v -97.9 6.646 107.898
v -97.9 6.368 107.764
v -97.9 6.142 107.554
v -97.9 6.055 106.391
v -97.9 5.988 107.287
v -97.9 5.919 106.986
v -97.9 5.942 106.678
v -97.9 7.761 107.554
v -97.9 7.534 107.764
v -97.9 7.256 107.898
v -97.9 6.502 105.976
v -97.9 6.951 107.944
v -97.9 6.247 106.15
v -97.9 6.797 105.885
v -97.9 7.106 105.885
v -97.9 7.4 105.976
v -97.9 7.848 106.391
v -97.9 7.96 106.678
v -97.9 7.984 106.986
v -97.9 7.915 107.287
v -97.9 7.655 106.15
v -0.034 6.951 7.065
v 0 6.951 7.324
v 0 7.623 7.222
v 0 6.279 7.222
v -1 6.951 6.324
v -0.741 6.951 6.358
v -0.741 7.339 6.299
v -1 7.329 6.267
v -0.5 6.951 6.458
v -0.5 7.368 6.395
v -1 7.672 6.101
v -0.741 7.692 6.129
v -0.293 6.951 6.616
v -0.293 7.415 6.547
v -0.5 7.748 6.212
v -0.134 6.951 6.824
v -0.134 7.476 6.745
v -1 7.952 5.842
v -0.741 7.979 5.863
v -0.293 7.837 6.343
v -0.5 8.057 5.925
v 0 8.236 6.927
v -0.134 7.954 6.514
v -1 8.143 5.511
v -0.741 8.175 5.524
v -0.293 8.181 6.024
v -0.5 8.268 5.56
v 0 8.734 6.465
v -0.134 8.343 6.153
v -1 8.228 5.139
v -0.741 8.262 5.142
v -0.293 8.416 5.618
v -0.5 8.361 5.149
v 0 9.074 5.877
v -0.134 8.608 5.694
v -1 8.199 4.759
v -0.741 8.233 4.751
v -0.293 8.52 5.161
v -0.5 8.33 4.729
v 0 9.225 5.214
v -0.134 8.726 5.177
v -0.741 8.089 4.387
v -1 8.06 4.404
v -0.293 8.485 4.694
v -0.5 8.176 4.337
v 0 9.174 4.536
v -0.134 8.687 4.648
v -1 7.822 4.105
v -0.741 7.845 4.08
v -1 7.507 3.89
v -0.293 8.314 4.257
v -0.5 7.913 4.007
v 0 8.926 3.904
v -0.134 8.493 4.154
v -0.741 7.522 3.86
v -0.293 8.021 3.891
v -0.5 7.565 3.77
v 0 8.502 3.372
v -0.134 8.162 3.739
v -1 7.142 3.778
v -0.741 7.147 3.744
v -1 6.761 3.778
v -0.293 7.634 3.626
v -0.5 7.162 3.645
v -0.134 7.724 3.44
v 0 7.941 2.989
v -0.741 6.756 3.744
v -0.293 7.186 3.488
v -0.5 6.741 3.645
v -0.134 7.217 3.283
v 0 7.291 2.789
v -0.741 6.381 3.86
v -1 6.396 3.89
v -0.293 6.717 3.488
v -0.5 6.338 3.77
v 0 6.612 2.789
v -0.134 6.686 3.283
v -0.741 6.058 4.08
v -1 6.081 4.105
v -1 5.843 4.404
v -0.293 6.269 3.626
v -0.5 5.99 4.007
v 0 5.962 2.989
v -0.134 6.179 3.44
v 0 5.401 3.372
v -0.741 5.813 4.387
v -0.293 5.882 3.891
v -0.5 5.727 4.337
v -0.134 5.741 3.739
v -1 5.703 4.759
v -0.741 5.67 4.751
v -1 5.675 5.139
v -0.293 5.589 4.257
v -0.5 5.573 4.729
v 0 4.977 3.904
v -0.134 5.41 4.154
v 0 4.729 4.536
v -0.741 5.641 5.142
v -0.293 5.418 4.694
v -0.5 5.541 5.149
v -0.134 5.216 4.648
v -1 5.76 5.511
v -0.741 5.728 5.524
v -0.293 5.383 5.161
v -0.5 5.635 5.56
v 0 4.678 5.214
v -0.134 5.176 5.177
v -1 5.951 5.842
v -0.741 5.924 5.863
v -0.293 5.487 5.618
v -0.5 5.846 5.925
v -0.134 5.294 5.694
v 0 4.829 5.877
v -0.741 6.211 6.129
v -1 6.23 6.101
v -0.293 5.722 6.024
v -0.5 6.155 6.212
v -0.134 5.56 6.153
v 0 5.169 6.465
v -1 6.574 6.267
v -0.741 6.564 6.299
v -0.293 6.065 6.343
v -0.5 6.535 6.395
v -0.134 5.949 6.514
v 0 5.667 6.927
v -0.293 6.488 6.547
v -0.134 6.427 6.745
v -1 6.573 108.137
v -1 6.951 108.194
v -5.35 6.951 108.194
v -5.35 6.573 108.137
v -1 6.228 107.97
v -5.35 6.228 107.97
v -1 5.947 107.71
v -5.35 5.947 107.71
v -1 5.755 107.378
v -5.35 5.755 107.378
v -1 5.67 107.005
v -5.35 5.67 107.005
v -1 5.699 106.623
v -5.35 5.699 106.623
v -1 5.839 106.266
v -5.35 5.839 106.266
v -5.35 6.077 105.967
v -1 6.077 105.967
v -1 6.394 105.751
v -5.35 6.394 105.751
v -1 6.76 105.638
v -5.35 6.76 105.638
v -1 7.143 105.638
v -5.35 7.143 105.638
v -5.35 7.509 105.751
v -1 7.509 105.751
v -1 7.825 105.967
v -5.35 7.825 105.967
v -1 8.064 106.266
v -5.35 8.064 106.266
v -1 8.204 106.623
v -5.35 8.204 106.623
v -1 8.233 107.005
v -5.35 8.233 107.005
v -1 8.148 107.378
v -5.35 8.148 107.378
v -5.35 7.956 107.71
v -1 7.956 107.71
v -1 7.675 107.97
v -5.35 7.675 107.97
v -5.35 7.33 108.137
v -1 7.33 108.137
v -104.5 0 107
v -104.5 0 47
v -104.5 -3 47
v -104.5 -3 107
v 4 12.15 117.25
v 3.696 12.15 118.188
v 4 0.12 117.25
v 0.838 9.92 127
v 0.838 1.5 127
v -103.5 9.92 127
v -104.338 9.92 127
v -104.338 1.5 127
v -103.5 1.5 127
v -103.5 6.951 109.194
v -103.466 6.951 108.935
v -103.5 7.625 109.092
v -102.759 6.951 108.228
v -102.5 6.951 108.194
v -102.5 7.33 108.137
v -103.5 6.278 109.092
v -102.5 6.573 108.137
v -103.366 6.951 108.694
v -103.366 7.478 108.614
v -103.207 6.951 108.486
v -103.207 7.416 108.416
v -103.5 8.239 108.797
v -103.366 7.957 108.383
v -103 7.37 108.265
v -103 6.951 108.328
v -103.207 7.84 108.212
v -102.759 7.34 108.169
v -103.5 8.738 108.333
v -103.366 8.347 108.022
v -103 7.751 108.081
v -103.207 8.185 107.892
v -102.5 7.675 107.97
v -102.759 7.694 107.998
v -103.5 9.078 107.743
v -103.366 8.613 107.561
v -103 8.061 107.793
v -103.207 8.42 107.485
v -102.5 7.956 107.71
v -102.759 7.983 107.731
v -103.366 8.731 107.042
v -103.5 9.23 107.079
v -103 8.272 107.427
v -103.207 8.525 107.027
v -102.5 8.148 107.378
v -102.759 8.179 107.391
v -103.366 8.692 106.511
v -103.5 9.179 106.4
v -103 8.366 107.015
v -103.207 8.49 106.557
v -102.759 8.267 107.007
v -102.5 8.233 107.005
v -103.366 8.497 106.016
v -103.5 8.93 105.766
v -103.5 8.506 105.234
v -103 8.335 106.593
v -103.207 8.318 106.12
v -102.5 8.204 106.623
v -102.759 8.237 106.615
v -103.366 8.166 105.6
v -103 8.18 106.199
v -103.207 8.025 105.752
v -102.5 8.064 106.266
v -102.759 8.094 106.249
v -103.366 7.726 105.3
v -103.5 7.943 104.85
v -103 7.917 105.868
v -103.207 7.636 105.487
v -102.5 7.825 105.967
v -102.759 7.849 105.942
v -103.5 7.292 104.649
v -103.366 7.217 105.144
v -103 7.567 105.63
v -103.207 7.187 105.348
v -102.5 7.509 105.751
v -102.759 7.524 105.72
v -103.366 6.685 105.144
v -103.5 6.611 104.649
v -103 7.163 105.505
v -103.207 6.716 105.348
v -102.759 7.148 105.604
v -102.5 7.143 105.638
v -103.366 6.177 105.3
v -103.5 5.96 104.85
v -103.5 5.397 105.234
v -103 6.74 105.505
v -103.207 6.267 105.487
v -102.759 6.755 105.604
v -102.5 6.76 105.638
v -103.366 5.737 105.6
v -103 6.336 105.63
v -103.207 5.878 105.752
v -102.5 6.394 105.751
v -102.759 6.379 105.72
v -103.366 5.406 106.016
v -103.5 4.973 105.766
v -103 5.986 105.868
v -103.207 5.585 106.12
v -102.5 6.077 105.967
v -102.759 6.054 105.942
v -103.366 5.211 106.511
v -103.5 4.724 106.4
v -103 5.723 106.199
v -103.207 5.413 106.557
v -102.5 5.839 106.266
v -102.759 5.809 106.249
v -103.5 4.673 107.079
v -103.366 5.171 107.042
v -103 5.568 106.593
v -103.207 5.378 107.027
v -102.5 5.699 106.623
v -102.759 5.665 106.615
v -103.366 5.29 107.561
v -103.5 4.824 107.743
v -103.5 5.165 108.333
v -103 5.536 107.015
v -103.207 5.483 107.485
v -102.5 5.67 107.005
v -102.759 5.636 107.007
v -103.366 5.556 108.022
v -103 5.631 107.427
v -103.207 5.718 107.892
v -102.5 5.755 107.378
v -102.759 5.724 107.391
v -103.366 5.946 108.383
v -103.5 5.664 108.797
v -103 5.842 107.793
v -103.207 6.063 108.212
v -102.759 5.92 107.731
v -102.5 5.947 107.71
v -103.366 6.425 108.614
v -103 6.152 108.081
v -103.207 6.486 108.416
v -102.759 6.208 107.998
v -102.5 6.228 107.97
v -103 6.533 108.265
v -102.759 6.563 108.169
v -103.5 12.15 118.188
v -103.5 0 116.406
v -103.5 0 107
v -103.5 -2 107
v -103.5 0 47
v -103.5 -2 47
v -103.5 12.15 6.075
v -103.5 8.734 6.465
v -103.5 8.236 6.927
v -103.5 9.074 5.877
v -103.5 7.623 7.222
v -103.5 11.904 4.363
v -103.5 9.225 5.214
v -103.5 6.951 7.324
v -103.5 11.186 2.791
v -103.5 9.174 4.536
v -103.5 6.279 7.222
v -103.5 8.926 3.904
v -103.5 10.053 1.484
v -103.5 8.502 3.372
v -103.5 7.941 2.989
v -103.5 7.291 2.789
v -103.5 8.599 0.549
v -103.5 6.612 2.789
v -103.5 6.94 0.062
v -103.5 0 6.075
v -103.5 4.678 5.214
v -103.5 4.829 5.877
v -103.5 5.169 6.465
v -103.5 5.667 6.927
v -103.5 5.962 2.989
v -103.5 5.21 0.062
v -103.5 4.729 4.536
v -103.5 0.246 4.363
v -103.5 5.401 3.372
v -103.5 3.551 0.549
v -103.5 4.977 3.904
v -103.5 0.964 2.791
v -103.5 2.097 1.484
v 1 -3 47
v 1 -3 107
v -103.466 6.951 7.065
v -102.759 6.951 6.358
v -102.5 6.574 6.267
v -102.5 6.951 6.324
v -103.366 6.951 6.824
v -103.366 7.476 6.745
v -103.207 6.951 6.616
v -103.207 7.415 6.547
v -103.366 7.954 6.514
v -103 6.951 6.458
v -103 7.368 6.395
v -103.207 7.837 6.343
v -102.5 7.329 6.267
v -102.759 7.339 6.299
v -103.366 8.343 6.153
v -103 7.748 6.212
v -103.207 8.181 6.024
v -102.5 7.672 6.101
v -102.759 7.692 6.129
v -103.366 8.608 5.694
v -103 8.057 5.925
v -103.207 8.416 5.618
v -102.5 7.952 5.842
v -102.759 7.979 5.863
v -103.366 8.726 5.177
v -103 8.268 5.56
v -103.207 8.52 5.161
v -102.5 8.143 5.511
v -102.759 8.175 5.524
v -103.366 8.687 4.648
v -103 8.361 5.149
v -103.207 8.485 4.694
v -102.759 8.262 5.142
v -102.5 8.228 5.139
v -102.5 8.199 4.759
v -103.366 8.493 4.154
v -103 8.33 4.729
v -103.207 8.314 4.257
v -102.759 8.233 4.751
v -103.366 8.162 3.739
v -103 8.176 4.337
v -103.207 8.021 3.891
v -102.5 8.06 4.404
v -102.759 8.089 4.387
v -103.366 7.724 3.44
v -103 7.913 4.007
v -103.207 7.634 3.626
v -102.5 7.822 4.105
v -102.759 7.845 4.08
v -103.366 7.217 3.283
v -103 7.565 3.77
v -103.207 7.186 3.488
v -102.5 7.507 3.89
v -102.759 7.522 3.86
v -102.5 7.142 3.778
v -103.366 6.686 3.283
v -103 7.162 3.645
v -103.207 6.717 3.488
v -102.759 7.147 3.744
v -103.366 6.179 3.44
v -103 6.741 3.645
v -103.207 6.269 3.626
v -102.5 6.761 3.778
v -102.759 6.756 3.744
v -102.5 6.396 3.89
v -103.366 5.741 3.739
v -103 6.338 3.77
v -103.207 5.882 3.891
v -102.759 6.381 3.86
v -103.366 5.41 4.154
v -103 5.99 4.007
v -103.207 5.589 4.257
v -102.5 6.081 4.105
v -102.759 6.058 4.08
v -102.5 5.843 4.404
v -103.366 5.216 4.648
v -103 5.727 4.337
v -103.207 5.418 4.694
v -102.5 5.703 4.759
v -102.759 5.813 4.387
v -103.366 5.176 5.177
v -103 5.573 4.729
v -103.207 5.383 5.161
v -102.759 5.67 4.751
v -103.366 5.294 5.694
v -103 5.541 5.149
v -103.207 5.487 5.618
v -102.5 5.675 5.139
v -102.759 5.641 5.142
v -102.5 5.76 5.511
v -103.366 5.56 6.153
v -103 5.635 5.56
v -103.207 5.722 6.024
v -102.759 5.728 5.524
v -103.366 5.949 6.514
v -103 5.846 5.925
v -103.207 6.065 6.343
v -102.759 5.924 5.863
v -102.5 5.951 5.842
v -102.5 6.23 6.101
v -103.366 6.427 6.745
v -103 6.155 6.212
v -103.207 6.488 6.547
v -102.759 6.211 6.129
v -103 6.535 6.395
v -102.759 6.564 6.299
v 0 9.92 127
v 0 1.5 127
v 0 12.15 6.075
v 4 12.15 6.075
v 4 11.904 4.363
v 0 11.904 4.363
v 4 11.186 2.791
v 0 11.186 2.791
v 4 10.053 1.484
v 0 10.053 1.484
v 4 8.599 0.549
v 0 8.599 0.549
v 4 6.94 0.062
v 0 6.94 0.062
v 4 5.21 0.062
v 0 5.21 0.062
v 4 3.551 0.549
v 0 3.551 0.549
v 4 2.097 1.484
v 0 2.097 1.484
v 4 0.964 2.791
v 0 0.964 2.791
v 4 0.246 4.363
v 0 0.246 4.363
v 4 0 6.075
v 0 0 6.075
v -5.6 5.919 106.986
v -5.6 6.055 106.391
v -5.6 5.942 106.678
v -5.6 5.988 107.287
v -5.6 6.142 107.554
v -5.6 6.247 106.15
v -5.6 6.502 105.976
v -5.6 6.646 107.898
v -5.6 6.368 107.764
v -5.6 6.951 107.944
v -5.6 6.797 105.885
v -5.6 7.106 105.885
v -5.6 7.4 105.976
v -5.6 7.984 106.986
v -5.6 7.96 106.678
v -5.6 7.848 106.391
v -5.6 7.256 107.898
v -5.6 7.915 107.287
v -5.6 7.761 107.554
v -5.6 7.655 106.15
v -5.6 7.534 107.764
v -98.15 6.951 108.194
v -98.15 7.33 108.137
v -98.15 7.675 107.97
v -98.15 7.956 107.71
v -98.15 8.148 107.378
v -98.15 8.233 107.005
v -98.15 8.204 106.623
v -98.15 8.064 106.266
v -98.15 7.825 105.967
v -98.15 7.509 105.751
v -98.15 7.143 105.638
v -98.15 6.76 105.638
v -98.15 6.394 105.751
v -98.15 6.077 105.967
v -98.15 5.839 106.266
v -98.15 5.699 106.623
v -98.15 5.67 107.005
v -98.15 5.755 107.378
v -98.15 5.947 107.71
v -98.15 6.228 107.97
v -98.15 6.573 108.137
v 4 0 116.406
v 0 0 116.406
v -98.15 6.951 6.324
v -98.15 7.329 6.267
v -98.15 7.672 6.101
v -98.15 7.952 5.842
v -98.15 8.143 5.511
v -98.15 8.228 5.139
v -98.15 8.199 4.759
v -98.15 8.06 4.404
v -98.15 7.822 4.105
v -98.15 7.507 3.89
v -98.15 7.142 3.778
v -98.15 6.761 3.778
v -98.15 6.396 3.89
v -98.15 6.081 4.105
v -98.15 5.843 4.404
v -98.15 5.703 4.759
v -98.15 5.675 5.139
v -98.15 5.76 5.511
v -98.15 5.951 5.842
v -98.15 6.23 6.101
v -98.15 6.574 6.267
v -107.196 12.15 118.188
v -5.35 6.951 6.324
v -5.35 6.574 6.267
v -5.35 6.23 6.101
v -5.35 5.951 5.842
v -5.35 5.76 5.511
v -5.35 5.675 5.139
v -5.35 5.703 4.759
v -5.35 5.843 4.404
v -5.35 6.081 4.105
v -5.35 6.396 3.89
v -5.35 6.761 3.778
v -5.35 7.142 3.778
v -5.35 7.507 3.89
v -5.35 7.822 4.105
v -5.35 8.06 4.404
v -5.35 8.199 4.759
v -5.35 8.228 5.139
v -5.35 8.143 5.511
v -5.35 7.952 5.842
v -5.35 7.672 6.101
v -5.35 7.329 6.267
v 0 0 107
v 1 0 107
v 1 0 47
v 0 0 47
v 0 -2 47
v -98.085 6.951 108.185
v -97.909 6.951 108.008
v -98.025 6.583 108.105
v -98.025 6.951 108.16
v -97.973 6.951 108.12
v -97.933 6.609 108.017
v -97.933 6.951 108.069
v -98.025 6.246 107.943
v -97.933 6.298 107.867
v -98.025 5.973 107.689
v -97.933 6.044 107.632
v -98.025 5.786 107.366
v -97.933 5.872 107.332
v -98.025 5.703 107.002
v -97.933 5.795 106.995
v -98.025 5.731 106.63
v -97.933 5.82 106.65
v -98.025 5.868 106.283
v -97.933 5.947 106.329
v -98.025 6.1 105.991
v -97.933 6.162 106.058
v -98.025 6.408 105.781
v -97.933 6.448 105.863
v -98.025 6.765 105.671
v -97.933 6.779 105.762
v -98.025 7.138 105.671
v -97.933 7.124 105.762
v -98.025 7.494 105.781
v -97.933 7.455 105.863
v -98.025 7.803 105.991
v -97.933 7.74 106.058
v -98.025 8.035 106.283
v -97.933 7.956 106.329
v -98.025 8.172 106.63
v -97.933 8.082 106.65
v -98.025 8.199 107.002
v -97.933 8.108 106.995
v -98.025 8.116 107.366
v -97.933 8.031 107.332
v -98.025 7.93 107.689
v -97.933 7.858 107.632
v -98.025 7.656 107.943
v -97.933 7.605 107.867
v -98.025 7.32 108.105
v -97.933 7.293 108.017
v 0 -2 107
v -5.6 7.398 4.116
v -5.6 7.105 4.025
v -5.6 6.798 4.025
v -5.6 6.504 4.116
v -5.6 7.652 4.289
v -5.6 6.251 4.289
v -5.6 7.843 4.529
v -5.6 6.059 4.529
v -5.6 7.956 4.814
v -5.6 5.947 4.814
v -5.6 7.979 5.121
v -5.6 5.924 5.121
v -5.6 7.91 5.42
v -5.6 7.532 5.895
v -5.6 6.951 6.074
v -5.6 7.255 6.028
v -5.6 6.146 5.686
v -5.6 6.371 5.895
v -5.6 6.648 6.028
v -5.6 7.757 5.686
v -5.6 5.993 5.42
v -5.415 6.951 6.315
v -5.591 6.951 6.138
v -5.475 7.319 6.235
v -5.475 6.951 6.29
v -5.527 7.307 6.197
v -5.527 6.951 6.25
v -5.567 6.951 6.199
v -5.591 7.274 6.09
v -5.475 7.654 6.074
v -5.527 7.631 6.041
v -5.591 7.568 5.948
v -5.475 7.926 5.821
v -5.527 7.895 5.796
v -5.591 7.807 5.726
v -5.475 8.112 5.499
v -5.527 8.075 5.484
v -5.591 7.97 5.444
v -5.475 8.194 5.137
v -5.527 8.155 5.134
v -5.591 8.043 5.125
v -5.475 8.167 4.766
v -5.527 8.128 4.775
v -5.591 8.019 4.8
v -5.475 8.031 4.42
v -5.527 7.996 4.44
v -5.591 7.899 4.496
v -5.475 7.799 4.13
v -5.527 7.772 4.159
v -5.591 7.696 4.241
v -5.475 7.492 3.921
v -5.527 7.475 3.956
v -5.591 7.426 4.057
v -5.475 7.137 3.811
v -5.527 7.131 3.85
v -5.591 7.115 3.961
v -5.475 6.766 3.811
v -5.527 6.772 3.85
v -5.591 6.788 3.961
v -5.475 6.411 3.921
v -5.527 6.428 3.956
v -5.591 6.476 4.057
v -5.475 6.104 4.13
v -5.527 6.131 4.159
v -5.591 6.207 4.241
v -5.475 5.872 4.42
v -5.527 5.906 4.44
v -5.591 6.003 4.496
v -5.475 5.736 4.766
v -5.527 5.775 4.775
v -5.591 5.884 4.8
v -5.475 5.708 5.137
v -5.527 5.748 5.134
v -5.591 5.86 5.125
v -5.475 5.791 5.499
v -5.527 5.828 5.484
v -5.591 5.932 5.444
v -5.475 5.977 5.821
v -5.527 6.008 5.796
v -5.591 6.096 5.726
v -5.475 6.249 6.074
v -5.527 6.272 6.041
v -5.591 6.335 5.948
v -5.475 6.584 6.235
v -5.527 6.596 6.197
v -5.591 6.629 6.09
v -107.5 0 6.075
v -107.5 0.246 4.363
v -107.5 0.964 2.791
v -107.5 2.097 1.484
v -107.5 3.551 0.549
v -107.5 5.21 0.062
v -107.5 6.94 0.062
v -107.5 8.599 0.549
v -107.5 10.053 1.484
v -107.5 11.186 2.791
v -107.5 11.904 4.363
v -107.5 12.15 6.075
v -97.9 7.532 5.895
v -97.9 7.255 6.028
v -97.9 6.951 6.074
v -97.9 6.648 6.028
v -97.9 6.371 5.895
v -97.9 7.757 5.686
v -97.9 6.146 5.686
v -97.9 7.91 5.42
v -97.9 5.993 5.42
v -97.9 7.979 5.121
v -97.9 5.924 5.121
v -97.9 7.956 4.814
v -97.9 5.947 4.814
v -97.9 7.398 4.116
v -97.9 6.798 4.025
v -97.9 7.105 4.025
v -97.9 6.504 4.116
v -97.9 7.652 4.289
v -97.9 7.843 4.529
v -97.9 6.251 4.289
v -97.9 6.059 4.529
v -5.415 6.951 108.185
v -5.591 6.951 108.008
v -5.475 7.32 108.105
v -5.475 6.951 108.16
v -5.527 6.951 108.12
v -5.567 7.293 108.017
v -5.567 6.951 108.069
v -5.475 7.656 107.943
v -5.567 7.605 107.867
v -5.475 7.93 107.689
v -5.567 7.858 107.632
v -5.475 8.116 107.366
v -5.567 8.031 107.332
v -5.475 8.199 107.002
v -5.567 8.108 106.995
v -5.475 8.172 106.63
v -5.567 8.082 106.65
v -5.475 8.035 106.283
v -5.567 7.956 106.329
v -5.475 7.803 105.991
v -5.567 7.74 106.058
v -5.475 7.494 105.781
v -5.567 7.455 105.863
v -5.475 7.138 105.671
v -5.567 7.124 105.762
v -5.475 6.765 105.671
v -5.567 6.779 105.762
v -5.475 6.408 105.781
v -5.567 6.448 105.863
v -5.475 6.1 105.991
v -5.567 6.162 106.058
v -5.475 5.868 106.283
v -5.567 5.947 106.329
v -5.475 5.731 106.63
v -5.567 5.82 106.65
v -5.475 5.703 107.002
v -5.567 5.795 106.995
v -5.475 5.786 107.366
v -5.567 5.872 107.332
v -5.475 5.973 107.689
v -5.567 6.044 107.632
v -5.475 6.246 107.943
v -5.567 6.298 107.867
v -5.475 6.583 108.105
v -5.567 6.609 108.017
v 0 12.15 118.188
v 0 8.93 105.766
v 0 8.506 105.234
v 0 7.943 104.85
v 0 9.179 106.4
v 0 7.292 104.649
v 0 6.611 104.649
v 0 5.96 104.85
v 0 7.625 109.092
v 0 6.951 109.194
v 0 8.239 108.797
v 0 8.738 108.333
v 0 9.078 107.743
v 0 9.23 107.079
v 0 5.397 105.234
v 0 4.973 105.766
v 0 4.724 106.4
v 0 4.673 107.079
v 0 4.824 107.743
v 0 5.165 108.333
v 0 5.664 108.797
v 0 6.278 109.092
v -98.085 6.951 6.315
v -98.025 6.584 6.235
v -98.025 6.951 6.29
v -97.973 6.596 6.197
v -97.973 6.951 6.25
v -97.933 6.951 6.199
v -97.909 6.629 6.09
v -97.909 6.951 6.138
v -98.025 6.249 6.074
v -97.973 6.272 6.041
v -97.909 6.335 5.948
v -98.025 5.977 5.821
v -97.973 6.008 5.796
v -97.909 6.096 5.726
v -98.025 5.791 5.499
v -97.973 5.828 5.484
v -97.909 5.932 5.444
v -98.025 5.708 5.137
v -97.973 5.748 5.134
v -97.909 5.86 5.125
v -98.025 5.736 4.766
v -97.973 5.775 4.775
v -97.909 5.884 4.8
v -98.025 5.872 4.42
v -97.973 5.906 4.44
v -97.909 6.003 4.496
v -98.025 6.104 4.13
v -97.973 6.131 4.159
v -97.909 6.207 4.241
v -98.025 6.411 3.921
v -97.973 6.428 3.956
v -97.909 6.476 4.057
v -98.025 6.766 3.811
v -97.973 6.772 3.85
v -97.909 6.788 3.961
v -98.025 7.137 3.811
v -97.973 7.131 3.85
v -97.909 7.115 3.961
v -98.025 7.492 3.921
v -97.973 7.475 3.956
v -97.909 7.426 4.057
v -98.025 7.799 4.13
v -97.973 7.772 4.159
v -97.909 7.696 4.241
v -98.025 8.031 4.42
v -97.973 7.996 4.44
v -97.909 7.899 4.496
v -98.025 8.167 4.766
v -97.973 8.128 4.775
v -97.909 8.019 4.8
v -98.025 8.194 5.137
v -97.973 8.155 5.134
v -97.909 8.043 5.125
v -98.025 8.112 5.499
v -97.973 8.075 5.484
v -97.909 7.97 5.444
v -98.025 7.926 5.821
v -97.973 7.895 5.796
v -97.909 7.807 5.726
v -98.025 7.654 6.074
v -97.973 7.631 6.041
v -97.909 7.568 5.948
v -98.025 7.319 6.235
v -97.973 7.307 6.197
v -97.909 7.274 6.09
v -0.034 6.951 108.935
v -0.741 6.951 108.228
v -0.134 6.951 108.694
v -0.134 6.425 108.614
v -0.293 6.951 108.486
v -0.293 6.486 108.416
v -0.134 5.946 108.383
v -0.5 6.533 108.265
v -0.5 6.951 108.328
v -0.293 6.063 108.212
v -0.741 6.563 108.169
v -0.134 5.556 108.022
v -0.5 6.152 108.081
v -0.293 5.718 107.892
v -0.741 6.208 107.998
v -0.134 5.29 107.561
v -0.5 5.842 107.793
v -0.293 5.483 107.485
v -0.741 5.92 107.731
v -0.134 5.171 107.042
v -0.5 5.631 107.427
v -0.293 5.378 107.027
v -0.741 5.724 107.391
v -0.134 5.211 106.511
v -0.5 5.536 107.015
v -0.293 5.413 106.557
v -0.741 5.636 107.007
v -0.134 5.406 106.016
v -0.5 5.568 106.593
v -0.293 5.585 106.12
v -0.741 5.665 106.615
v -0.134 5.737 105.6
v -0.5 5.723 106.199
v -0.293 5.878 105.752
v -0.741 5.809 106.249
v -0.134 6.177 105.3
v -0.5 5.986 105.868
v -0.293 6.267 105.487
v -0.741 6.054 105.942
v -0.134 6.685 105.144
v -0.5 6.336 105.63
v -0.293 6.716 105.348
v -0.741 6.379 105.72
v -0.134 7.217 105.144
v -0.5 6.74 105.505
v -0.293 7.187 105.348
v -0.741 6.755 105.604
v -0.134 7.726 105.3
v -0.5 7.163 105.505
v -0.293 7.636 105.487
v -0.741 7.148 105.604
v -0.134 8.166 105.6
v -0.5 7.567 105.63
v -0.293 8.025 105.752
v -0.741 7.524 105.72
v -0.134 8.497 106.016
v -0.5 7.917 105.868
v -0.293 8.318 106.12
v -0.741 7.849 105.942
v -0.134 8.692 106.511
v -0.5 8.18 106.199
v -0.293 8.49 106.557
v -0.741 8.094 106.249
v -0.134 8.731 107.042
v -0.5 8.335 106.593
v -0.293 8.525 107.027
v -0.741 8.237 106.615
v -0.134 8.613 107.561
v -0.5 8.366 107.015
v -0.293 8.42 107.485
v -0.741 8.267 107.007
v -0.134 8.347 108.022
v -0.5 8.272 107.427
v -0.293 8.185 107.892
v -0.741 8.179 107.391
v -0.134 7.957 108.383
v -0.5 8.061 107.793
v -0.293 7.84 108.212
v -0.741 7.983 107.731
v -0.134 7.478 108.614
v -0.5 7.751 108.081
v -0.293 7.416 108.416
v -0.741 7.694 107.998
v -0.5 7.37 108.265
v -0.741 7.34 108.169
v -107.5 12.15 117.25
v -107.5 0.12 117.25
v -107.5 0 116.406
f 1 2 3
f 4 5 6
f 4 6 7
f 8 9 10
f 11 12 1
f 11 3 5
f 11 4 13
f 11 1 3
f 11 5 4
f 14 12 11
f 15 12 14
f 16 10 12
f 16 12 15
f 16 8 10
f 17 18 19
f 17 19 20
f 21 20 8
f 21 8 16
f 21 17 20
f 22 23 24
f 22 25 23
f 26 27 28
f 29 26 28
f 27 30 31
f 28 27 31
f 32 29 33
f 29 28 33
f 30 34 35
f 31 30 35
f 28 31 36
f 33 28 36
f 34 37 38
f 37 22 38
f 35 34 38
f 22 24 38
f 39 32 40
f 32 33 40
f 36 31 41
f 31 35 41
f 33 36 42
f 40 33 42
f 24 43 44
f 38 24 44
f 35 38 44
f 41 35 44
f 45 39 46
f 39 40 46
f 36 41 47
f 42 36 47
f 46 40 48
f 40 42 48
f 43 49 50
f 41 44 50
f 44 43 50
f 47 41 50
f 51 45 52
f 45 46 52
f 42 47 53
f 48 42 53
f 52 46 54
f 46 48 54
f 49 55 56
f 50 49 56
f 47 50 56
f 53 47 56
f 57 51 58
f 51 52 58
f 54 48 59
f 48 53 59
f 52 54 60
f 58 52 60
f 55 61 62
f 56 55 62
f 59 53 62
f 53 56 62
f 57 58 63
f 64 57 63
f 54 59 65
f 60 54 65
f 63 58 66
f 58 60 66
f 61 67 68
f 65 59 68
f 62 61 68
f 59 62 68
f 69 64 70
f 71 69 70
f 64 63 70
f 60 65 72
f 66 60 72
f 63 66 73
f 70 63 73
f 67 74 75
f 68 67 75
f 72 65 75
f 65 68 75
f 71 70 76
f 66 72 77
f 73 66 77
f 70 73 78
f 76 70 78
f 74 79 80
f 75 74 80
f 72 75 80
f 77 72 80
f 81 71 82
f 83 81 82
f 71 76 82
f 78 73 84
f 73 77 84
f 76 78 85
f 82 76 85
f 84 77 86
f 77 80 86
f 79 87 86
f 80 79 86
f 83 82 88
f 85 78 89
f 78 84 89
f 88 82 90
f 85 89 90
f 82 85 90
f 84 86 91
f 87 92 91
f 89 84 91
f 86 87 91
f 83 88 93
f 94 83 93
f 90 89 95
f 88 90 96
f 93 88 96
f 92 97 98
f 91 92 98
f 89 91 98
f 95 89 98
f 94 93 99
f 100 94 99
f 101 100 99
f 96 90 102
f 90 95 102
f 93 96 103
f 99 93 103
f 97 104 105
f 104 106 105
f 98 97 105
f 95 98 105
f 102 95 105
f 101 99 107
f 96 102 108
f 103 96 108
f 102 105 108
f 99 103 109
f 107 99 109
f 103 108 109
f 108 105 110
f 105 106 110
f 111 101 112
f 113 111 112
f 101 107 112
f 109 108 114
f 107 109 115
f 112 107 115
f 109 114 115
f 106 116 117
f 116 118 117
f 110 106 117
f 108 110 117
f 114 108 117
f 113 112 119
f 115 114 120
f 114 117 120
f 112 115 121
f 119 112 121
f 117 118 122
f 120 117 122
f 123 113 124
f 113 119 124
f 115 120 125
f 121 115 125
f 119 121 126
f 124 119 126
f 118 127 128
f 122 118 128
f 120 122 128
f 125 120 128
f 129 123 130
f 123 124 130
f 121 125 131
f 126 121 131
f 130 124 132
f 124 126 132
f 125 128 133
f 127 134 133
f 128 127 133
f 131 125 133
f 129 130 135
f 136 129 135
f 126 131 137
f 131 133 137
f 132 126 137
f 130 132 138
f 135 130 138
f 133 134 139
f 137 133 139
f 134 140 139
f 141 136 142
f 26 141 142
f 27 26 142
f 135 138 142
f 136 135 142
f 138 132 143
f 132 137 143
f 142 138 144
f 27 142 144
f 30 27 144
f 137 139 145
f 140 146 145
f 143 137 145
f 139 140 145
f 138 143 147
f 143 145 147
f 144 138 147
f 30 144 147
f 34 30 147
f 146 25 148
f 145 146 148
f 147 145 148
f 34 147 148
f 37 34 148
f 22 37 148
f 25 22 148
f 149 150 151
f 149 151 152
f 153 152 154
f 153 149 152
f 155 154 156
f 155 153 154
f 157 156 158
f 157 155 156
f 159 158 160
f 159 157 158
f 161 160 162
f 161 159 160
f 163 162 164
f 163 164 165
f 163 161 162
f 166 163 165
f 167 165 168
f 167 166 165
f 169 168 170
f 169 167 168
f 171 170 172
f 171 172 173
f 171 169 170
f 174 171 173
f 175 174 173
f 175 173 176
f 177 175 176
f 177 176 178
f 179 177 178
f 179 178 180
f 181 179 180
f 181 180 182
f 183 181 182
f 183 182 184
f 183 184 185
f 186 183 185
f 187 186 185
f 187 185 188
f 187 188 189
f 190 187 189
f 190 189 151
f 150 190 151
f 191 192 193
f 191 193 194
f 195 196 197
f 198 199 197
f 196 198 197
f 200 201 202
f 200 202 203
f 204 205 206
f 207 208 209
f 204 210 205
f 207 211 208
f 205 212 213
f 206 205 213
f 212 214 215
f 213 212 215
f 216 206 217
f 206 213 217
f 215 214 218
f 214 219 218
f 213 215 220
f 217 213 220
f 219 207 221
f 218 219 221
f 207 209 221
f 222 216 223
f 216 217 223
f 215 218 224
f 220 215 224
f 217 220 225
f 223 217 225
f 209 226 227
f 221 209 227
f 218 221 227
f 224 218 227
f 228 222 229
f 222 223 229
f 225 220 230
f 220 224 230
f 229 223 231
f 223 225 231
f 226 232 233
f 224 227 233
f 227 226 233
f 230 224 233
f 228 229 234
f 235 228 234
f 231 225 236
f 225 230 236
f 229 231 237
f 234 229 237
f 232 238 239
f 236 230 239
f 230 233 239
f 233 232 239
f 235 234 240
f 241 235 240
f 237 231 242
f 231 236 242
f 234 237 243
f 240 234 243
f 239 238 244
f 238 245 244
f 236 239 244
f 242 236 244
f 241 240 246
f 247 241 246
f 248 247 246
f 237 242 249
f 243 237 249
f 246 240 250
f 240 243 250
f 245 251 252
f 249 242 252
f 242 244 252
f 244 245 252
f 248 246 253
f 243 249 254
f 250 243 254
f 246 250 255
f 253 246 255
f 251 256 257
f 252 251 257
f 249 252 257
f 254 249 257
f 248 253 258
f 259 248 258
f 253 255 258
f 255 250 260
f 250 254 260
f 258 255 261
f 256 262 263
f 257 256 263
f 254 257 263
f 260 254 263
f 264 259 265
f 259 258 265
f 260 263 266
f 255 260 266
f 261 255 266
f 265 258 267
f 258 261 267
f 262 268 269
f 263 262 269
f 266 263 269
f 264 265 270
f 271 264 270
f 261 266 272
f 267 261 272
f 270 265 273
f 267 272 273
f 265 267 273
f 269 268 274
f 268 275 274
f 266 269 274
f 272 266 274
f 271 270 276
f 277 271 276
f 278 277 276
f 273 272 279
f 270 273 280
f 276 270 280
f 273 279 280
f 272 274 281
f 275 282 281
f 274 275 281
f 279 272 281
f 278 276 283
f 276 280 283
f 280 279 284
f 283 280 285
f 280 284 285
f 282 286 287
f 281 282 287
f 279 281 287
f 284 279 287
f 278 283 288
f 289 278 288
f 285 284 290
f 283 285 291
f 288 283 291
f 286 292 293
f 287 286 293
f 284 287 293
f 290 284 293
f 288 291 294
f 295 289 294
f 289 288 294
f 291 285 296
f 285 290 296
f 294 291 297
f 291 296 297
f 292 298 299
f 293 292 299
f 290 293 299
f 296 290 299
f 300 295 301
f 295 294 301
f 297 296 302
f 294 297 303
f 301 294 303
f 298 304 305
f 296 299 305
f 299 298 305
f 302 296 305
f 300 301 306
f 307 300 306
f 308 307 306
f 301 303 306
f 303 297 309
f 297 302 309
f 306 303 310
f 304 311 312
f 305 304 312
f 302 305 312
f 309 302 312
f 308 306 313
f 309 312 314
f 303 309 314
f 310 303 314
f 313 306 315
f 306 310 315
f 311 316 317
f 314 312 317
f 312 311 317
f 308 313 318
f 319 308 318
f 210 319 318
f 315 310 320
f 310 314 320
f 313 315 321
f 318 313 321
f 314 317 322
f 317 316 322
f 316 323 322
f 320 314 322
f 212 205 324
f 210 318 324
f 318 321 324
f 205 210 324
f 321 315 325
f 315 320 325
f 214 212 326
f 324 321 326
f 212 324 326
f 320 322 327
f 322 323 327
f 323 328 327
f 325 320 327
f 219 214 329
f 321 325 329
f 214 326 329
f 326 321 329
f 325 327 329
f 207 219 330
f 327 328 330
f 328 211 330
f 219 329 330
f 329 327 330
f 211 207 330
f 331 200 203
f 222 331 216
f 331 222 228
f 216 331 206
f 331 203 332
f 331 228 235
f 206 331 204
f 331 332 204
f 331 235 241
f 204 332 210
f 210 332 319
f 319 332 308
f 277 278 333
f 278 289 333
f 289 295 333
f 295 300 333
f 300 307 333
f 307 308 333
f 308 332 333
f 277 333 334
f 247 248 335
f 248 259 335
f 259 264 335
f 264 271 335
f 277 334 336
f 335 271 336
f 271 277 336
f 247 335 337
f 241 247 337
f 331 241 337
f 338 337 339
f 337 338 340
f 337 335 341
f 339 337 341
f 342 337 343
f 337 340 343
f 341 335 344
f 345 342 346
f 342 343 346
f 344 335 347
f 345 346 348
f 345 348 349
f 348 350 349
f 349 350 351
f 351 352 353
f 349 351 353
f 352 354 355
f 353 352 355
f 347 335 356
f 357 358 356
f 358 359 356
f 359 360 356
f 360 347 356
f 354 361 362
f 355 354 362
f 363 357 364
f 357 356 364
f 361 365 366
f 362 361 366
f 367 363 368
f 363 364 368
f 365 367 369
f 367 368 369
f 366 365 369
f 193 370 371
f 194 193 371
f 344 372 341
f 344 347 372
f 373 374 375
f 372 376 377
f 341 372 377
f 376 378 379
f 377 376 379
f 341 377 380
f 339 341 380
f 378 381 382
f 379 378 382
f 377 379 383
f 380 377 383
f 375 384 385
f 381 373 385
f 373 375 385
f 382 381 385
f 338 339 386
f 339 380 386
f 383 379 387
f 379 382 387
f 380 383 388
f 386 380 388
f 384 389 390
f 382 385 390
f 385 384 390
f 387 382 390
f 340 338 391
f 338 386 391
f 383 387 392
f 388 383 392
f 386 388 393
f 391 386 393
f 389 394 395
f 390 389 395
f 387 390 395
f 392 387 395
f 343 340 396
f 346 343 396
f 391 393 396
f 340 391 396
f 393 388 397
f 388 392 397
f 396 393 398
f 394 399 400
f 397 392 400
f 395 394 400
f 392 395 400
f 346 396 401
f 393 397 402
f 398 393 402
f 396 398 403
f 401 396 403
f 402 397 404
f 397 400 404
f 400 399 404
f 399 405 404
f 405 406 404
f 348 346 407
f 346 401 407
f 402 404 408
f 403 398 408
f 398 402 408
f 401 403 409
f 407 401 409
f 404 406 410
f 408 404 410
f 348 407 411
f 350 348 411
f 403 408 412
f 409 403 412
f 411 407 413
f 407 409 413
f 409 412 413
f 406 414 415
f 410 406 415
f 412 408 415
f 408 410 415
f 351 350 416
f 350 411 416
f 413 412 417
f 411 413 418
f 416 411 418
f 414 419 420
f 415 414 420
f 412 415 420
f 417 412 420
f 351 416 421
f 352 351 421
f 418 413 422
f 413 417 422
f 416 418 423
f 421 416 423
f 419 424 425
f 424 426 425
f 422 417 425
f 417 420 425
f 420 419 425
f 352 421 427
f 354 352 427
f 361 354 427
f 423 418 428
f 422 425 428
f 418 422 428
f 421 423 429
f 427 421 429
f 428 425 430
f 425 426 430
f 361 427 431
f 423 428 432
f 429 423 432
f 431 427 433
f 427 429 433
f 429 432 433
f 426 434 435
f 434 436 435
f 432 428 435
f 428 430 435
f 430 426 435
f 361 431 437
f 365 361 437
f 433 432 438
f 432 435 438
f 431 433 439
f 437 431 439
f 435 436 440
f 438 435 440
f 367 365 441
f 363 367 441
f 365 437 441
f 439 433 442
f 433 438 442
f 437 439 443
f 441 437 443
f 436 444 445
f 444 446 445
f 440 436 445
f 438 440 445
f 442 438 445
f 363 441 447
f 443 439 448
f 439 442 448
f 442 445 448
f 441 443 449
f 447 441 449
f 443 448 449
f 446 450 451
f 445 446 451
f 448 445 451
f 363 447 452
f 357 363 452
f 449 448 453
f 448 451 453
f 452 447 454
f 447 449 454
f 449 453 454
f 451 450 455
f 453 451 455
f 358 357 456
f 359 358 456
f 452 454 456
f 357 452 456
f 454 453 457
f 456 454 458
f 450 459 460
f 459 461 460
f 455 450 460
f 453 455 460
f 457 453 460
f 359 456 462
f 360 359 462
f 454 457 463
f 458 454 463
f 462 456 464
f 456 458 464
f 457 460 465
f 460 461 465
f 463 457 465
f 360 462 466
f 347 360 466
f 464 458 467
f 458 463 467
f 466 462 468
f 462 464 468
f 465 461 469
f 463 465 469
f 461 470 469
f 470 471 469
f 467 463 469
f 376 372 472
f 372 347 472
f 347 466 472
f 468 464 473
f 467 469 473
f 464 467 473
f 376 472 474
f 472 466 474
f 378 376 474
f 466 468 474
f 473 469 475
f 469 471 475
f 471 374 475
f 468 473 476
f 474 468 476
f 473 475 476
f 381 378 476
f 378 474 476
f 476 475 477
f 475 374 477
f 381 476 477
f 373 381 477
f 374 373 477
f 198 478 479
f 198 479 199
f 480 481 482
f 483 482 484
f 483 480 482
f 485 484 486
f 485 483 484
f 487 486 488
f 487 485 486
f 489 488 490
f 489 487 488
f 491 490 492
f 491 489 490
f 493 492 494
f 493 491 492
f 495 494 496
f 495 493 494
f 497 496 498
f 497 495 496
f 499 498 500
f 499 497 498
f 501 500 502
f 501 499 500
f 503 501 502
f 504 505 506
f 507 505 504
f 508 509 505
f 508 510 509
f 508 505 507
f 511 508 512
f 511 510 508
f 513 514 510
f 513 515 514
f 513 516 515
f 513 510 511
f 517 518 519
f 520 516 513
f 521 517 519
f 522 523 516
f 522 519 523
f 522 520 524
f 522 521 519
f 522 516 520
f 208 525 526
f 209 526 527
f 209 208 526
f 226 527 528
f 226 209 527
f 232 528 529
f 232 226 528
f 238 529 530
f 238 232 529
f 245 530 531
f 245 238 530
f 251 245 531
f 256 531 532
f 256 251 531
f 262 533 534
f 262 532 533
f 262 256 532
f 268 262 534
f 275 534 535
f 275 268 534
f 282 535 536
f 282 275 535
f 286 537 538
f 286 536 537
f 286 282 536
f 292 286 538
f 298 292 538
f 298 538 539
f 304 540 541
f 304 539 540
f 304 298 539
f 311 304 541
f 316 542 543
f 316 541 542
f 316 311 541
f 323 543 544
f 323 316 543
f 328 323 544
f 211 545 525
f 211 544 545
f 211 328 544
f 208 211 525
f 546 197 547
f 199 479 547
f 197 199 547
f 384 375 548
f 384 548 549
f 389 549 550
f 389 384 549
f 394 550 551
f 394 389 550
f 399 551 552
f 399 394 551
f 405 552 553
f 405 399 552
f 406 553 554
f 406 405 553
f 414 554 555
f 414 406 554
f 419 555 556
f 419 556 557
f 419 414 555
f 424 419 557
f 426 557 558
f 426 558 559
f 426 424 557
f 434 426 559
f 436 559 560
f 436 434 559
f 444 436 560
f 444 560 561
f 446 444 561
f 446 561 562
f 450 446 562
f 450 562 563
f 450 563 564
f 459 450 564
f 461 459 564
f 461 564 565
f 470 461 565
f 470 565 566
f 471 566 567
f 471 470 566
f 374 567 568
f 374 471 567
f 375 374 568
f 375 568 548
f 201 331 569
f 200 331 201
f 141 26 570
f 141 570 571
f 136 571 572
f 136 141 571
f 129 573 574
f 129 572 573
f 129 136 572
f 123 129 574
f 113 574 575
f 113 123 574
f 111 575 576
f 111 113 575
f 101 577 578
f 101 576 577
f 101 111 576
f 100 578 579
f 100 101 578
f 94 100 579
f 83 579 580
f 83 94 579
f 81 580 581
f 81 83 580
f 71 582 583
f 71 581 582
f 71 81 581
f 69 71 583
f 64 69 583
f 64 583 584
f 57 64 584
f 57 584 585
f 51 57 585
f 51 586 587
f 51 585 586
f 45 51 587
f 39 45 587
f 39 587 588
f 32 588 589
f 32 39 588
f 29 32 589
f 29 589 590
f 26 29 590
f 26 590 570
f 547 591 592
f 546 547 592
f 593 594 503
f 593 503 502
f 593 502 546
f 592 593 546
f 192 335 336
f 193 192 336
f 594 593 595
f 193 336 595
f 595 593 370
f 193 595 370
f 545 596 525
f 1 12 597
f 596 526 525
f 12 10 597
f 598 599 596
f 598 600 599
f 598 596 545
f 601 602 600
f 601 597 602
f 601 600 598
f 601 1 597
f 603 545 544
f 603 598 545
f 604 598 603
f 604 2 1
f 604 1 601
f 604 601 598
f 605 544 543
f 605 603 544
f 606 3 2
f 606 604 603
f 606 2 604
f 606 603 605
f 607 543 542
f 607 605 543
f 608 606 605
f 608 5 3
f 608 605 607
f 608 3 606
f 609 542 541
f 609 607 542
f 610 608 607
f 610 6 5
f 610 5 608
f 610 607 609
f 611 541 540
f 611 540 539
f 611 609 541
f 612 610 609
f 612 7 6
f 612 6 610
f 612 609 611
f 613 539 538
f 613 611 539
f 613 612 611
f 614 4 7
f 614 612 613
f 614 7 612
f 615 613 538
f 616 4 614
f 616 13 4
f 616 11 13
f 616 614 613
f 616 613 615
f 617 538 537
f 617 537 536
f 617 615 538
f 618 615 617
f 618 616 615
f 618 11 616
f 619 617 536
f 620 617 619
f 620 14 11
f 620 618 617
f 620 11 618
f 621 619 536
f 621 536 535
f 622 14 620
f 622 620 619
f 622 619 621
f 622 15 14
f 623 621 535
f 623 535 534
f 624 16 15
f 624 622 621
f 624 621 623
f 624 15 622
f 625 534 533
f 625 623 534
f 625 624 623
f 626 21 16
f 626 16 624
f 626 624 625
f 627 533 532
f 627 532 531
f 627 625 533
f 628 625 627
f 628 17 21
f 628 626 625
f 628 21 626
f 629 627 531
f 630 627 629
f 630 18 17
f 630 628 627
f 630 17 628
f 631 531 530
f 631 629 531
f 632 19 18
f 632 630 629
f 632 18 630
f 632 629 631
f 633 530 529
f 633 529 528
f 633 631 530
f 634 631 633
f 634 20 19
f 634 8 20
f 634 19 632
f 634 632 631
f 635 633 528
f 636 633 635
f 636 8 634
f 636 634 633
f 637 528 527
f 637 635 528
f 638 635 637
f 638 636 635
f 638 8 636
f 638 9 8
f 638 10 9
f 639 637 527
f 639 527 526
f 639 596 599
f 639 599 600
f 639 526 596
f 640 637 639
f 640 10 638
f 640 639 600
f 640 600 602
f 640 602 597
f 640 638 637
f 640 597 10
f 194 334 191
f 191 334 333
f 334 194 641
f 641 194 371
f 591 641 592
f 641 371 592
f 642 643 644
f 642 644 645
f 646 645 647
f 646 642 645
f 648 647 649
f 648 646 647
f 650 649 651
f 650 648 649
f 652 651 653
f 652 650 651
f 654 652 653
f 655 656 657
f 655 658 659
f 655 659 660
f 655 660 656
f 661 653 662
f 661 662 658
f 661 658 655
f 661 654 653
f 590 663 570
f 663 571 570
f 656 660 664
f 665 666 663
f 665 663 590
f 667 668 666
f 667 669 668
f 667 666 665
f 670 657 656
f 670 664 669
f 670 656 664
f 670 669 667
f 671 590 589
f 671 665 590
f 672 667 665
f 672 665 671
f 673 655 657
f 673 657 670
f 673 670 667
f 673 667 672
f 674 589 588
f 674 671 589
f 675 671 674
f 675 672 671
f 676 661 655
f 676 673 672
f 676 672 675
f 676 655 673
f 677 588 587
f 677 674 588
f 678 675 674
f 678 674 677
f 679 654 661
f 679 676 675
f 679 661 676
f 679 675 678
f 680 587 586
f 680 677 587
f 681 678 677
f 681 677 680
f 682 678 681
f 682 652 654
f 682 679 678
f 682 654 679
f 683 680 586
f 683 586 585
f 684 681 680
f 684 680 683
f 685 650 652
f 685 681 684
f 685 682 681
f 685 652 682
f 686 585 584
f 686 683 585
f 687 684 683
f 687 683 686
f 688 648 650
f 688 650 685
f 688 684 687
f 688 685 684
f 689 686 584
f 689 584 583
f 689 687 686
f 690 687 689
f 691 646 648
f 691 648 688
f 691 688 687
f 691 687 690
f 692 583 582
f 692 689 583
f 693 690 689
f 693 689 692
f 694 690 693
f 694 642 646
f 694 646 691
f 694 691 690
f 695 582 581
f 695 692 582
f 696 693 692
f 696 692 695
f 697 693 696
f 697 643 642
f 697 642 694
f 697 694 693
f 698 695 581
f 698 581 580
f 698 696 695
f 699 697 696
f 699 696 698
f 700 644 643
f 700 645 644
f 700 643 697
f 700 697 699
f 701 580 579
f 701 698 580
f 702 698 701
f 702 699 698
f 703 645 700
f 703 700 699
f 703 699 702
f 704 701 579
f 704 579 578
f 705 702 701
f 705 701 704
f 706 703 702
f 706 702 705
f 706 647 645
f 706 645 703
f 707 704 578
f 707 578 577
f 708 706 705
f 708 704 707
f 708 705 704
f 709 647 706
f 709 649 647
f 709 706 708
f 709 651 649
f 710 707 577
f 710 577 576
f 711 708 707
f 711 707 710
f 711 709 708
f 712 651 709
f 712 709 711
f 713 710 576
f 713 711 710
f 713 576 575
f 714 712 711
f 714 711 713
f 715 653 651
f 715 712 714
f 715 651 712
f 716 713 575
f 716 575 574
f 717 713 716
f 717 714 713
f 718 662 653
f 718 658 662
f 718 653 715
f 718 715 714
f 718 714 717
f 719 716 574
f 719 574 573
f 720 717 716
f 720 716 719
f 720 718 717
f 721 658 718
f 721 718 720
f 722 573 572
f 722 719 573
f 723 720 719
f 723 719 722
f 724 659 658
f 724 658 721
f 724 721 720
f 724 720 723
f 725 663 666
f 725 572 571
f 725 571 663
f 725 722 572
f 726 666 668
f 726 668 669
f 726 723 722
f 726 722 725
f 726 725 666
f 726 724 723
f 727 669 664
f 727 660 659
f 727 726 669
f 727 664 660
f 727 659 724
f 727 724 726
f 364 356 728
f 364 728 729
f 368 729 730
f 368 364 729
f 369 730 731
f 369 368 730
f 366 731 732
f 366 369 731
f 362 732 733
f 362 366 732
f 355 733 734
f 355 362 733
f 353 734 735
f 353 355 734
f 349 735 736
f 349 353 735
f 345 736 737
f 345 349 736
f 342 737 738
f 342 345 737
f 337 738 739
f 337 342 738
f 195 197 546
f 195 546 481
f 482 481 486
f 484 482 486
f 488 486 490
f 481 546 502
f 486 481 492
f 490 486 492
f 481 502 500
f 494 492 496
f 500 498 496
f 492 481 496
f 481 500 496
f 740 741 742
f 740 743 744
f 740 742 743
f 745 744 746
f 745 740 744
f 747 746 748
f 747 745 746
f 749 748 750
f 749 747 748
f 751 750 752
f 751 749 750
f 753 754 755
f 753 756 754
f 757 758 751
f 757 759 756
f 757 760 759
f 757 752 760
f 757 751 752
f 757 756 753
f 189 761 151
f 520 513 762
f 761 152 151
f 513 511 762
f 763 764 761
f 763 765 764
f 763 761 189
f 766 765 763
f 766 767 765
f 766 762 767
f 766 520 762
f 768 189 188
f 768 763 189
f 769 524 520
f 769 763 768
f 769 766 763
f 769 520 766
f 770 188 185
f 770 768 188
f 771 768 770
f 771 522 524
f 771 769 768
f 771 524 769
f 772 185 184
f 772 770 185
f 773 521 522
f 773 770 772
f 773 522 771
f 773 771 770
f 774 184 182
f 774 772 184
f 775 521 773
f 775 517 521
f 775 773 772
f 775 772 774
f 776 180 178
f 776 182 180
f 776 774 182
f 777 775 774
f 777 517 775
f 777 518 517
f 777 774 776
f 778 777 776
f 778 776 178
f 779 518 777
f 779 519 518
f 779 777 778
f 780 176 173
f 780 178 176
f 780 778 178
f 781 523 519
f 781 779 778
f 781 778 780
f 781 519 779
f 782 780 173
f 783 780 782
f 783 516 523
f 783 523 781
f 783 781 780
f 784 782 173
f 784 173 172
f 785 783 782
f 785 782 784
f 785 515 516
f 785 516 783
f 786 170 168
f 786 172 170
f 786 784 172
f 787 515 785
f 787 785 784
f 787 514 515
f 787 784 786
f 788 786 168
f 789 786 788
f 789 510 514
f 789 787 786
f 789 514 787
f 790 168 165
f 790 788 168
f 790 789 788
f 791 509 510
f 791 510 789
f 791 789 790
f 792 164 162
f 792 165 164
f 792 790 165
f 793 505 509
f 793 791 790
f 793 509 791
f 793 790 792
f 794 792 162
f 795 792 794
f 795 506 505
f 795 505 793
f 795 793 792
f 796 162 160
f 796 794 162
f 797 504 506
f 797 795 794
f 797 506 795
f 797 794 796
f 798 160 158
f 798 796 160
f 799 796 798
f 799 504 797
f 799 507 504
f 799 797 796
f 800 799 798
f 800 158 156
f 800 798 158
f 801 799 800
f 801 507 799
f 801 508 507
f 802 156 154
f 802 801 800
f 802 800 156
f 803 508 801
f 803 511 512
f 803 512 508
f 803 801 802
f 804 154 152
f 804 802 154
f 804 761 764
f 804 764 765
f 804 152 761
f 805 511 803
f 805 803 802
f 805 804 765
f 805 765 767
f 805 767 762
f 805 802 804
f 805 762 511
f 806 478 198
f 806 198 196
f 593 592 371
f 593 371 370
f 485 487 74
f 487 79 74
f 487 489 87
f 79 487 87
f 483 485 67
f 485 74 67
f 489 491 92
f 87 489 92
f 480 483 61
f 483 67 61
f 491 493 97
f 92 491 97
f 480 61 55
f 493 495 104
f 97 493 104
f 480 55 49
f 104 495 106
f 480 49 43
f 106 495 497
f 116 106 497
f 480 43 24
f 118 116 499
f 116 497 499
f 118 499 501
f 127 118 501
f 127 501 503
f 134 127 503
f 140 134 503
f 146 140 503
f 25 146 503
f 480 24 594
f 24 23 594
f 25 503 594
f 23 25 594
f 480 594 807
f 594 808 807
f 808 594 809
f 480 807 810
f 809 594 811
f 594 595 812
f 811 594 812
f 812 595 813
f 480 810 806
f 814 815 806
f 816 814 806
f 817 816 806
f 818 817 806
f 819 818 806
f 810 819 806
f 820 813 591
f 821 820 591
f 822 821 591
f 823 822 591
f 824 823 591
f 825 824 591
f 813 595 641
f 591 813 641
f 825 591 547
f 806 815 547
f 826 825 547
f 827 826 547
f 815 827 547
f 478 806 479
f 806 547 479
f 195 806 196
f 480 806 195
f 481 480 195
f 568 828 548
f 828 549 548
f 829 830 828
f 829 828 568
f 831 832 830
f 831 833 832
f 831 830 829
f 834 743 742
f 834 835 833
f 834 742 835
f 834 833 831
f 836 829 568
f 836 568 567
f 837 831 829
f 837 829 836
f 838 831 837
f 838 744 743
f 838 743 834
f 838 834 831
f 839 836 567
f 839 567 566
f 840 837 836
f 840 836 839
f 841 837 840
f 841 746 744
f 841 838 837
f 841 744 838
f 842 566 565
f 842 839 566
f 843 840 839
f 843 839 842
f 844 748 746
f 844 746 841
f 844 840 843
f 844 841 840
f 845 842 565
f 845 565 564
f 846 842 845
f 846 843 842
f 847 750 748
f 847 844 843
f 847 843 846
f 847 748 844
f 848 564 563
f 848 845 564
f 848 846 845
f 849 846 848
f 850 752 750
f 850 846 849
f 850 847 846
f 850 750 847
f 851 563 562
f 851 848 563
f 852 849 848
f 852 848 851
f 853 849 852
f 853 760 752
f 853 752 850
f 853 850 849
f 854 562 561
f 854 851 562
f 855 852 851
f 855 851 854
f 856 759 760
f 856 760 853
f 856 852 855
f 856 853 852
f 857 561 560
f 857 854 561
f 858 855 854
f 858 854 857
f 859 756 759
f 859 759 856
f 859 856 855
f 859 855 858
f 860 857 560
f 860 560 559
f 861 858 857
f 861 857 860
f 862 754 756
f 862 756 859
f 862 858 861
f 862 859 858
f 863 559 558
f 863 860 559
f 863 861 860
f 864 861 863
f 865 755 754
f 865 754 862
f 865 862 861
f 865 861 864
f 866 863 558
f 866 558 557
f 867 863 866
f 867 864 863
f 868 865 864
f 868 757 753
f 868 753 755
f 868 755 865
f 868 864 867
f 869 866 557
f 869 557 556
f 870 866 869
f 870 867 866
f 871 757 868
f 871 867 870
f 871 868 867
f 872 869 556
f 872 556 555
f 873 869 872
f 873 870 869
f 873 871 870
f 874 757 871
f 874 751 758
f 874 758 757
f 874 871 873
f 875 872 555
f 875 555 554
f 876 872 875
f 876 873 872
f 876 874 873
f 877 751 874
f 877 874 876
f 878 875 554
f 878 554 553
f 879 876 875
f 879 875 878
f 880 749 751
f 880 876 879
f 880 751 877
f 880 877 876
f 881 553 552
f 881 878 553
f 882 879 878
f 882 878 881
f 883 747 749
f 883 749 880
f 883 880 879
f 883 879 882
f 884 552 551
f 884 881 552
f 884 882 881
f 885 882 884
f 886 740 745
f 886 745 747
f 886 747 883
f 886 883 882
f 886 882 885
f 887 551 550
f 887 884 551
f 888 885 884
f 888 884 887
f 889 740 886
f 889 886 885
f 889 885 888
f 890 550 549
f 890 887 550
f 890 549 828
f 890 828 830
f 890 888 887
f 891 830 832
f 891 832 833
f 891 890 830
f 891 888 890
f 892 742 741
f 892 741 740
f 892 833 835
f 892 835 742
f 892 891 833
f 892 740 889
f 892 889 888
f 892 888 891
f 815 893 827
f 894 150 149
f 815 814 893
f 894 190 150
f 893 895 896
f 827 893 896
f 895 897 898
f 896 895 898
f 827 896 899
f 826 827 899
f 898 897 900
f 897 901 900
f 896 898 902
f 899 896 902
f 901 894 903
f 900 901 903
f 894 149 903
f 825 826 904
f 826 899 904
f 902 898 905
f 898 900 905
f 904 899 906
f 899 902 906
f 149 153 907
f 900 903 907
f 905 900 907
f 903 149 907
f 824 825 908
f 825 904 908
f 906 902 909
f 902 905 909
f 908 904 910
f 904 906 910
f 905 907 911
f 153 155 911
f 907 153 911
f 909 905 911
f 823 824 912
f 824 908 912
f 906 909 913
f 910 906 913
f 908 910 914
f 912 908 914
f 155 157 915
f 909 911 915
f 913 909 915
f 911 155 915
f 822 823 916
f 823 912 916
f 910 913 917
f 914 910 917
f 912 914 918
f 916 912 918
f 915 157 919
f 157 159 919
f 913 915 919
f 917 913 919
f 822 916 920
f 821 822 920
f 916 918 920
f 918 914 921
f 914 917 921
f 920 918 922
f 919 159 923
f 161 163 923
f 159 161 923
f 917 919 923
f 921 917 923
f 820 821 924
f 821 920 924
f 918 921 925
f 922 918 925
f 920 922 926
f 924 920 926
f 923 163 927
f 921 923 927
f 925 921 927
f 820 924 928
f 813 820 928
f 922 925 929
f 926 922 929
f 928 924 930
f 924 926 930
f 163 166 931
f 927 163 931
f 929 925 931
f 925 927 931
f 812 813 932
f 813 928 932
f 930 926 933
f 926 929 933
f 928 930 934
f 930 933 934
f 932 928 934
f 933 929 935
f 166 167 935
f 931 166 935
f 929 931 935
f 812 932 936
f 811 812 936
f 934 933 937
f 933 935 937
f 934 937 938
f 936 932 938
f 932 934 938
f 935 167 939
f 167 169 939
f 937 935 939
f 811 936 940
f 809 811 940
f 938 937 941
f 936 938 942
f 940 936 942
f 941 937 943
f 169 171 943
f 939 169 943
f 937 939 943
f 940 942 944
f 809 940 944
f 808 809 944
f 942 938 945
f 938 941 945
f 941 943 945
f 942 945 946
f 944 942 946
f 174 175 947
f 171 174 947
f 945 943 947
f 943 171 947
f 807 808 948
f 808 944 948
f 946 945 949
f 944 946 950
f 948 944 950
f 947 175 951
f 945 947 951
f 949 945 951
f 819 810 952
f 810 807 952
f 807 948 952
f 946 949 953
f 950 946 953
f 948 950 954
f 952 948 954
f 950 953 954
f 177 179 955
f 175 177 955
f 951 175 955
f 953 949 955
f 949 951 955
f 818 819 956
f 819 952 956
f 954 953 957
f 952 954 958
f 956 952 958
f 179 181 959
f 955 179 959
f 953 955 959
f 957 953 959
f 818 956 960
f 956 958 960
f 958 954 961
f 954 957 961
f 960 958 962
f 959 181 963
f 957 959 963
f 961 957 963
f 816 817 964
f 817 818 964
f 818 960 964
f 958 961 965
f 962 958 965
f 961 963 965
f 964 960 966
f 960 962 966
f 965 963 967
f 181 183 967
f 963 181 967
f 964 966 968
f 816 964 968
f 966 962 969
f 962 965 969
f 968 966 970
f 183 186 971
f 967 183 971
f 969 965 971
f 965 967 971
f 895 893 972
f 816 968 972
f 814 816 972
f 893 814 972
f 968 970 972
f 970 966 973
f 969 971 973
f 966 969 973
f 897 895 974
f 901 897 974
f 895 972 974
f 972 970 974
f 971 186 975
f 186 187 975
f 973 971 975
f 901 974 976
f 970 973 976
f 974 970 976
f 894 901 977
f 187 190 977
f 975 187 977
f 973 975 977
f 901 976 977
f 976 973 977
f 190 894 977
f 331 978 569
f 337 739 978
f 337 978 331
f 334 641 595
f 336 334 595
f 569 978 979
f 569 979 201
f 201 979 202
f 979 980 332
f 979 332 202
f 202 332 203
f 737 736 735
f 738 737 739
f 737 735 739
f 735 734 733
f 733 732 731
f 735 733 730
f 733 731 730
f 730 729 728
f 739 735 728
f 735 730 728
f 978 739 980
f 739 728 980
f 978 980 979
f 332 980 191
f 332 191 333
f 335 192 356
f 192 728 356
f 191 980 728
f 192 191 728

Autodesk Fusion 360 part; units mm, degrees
sketch "Sketch1" plane through (0, 0, 0) normal (0, 1, 0) x (1, 0, 0)
  line L0 (0, 0) -> (0, -127)
  line L1 (0, -127) -> (0.8377, -127)
  line L2 (0.8377, -127) -> (4, -117.25)
  line L3 (4, -117.25) -> (4, 0)
  line L4 (4, 0) -> (0, 0)
  dimension "d1" = 127
  dimension "d3" = 117.25
  dimension "d160" = 10.25
  dimension "d182" = 4
extrude "Extrude1" add sketch "Sketch1" along normal blind 12.15
sketch "Sketch3" plane through (0, 0, 0) normal (-1, 0, 0) x (0, 0, 1)
  line L0 (0, 0) -> (127, 0)
  line L1 (127, 0) -> (127, 12.15)
  line L2 (127, 12.15) -> (0, 12.15)
  line L3 (0, 12.15) -> (0, 0)
  line L4 (127, 9.92) -> (118.1878, 12.15)
  line L5 (127, 1.5) -> (116.4057, 0)
  dimension "d11" = 9.09
  dimension "d12" = 2.23
  dimension "d13" = 10.7
  dimension "d14" = 1.5
extrude "Extrude3" cut sketch "Sketch3" along normal up to surface contours L0 L1 L5 | L1 L2 L4 end surface through (0.8377, 0, 127) normal (-0.95122, 0, -0.308515) offset 0
sketch "Sketch4" plane through (0, 0, 0) normal (-1, 0, 0) x (0, 0, 1)
  line L0 (127, 9.92) -> (118.1878, 12.15)
  line L1 (118.1878, 12.15) -> (0, 12.15)
  line L2 (0, 12.15) -> (0, 0)
  line L3 (0, 0) -> (116.4057, 0)
  line L4 (116.4057, 0) -> (127, 1.5)
  line L5 (127, 1.5) -> (127, 9.92)
  line L6 (0, 6.075) -> (6.075, 6.075)
  circle A0 centre (6.075, 6.075) radius 6.075
  dimension "d17" = 6.075
extrude "Extrude4" cut sketch "Sketch4" against normal up to surface (4 mm away) contours L1 L2 A0 | L2 L3 A0
sketch "Sketch6" plane through (0, 0, 0) normal (0, -1, 0) x (1, 0, 0)
  line L0 (0, 6.075) -> (4, 6.075)
  line L1 (4, 6.075) -> (4, 116.4057)
  line L2 (4, 116.4057) -> (0, 116.4057)
  line L3 (0, 116.4057) -> (0, 6.075)
  line L4 (0, 127) -> (0, 107)
  line L5 (0, 107) -> (0, 47)
  line L6 (0, 47) -> (1, 47)
  line L7 (1, 47) -> (0, 47)
  line L8 (0, 47) -> (0, 107)
  line L9 (0, 107) -> (1, 107)
  line L10 (1, 107) -> (1, 47)
  point P0 (0, 127)
  dimension "d27" = 20
  dimension "d28" = 60
  dimension "d29" = 1
extrude "Extrude6" add sketch "Sketch6" along normal blind 3 contours L3 L5 L6 L7 L8 L9 L10
sketch "Sketch7" plane through (0, 0, 0) normal (-1, 0, 0) x (0, 0, 1)
  arc A0 (6.075, 12.15) -> (6.075, 0) centre (6.075, 6.075) ccw
  line L0 (6.075, 0) -> (47, 0)
  line L1 (47, 0) -> (47, -3)
  line L2 (47, -3) -> (107, -3)
  line L3 (107, -3) -> (107, 0)
  line L4 (107, 0) -> (116.4057, 0)
  line L5 (116.4057, 0) -> (127, 1.5)
  line L6 (127, 1.5) -> (127, 9.92)
  line L7 (127, 9.92) -> (118.1878, 12.15)
  line L8 (118.1878, 12.15) -> (6.075, 12.15)
  line L9 (22, -5.25) -> (43, -5.25)
  line L10 (43, -5.25) -> (43, -1.5)
  line L11 (43, -1.5) -> (22, -1.5)
  line L12 (22, -1.5) -> (22, -5.25)
  line L13 (47, -3) -> (107, -3)
  line L14 (107, -3) -> (107, -2)
  line L15 (107, -2) -> (47, -2)
  line L16 (47, -2) -> (47, -3)
  dimension "d35" = 3.75
  dimension "d36" = 1
extrude "Extrude7" add sketch "Sketch7" along normal blind 51.75 contours L1 L2 L3 L13 L14 L15 L16
sketch "Sketch28" plane through (0, 0, 0) normal (-1, 0, 0) x (0, 0, 1)
  line L0 (116.4057, 0) -> (127, 1.5)
  line L1 (127, 1.5) -> (127, 9.92)
  line L2 (127, 9.92) -> (118.1878, 12.15)
  line L3 (118.1878, 12.15) -> (6.075, 12.15)
  arc A0 (6.075, 12.15) -> (6.075, 0) centre (6.075, 6.075) ccw
  line L4 (116.4057, 0) -> (127, 1.5)
  line L5 (59, -1.5) -> (79, -1.5)
  line L6 (79, 0) -> (116.4057, 0)
  circle A1 centre (106.9086, 6.9514) radius 1.285
  line L7 (127, 7.86) -> (106, 7.86)
  circle A2 centre (5.0436, 6.9514) radius 1.28
  arc A3 (0.45, 3.7804) -> (6.075, 0) centre (6.075, 6.075) ccw
  line L8 (59, 0) -> (59, -1.5)
  line L9 (43, 0) -> (59, 0)
  line L10 (106, 7.86) -> (106, 0)
  line L11 (118.1878, 12.15) -> (6.1, 12.15)
  line L12 (106, 7.86) -> (106.9086, 6.9514)
  line L13 (6.3236, 6.9514) -> (5.0436, 6.9514)
  line L14 (105.6236, 6.9514) -> (106.9086, 6.9514)
  line L15 (127, 1.5) -> (127, 9.92)
  line L16 (127, 9.92) -> (118.1878, 12.15)
  arc A4 (1, 9.4142) -> (0.45, 8.3696) centre (6.075, 6.075) ccw
  line L17 (105.6236, 6.9514) -> (6.3236, 6.9514)
  line L18 (79, -1.5) -> (79, 0)
  line L19 (106, 7.86) -> (107.285, 7.86) construction
  line L20 (43, -1.5) -> (43, 0)
  line L21 (22, -1.5) -> (43, -1.5)
  line L22 (22, 0) -> (22, -1.5)
  line L23 (6.075, 0) -> (22, 0)
  line L24 (47, -2) -> (107, -2)
  line L25 (107, 0) -> (116.4057, 0)
  line L26 (6.075, 0) -> (47, 0)
  line L27 (107, -2) -> (107, 0)
  line L28 (47, 0) -> (47, -2)
  dimension "d168" = 21
  dimension "d169" = 7.86
  dimension "d170" = 1.285
  dimension "d171" = 45
  dimension "d172" = 99.3
  dimension "d173" = 1.28
extrude "Extrude32" add sketch "Sketch28" along normal blind 5.6 contours A2 | A1 L7 | A1 L7 L10 L12 L14 | A1 L10 L14 | A1 L10 L14 | L10 L12 L14
fillet "Fillet15" radius 0.25 2 edges at (-5.6, 6.4867, 105.7106) (-5.6, 6.4885, 3.8503)
mirror "Mirror2" about plane through (-51.75, 0, 0) normal (-1, 0, 0) of bodies 1 merged
fillet "Fillet16" radius 1 4 edges at (0, 7.4142, 3.8503) (0, 7.416, 105.7106) (-103.5, 7.416, 105.7106) (-103.5, 7.4142, 3.8503)
equation "d17 = ( 12.15 / 2 ) * 1 mm"
equation "d37 = ( 103.5 / 2 ) * 1 mm"
